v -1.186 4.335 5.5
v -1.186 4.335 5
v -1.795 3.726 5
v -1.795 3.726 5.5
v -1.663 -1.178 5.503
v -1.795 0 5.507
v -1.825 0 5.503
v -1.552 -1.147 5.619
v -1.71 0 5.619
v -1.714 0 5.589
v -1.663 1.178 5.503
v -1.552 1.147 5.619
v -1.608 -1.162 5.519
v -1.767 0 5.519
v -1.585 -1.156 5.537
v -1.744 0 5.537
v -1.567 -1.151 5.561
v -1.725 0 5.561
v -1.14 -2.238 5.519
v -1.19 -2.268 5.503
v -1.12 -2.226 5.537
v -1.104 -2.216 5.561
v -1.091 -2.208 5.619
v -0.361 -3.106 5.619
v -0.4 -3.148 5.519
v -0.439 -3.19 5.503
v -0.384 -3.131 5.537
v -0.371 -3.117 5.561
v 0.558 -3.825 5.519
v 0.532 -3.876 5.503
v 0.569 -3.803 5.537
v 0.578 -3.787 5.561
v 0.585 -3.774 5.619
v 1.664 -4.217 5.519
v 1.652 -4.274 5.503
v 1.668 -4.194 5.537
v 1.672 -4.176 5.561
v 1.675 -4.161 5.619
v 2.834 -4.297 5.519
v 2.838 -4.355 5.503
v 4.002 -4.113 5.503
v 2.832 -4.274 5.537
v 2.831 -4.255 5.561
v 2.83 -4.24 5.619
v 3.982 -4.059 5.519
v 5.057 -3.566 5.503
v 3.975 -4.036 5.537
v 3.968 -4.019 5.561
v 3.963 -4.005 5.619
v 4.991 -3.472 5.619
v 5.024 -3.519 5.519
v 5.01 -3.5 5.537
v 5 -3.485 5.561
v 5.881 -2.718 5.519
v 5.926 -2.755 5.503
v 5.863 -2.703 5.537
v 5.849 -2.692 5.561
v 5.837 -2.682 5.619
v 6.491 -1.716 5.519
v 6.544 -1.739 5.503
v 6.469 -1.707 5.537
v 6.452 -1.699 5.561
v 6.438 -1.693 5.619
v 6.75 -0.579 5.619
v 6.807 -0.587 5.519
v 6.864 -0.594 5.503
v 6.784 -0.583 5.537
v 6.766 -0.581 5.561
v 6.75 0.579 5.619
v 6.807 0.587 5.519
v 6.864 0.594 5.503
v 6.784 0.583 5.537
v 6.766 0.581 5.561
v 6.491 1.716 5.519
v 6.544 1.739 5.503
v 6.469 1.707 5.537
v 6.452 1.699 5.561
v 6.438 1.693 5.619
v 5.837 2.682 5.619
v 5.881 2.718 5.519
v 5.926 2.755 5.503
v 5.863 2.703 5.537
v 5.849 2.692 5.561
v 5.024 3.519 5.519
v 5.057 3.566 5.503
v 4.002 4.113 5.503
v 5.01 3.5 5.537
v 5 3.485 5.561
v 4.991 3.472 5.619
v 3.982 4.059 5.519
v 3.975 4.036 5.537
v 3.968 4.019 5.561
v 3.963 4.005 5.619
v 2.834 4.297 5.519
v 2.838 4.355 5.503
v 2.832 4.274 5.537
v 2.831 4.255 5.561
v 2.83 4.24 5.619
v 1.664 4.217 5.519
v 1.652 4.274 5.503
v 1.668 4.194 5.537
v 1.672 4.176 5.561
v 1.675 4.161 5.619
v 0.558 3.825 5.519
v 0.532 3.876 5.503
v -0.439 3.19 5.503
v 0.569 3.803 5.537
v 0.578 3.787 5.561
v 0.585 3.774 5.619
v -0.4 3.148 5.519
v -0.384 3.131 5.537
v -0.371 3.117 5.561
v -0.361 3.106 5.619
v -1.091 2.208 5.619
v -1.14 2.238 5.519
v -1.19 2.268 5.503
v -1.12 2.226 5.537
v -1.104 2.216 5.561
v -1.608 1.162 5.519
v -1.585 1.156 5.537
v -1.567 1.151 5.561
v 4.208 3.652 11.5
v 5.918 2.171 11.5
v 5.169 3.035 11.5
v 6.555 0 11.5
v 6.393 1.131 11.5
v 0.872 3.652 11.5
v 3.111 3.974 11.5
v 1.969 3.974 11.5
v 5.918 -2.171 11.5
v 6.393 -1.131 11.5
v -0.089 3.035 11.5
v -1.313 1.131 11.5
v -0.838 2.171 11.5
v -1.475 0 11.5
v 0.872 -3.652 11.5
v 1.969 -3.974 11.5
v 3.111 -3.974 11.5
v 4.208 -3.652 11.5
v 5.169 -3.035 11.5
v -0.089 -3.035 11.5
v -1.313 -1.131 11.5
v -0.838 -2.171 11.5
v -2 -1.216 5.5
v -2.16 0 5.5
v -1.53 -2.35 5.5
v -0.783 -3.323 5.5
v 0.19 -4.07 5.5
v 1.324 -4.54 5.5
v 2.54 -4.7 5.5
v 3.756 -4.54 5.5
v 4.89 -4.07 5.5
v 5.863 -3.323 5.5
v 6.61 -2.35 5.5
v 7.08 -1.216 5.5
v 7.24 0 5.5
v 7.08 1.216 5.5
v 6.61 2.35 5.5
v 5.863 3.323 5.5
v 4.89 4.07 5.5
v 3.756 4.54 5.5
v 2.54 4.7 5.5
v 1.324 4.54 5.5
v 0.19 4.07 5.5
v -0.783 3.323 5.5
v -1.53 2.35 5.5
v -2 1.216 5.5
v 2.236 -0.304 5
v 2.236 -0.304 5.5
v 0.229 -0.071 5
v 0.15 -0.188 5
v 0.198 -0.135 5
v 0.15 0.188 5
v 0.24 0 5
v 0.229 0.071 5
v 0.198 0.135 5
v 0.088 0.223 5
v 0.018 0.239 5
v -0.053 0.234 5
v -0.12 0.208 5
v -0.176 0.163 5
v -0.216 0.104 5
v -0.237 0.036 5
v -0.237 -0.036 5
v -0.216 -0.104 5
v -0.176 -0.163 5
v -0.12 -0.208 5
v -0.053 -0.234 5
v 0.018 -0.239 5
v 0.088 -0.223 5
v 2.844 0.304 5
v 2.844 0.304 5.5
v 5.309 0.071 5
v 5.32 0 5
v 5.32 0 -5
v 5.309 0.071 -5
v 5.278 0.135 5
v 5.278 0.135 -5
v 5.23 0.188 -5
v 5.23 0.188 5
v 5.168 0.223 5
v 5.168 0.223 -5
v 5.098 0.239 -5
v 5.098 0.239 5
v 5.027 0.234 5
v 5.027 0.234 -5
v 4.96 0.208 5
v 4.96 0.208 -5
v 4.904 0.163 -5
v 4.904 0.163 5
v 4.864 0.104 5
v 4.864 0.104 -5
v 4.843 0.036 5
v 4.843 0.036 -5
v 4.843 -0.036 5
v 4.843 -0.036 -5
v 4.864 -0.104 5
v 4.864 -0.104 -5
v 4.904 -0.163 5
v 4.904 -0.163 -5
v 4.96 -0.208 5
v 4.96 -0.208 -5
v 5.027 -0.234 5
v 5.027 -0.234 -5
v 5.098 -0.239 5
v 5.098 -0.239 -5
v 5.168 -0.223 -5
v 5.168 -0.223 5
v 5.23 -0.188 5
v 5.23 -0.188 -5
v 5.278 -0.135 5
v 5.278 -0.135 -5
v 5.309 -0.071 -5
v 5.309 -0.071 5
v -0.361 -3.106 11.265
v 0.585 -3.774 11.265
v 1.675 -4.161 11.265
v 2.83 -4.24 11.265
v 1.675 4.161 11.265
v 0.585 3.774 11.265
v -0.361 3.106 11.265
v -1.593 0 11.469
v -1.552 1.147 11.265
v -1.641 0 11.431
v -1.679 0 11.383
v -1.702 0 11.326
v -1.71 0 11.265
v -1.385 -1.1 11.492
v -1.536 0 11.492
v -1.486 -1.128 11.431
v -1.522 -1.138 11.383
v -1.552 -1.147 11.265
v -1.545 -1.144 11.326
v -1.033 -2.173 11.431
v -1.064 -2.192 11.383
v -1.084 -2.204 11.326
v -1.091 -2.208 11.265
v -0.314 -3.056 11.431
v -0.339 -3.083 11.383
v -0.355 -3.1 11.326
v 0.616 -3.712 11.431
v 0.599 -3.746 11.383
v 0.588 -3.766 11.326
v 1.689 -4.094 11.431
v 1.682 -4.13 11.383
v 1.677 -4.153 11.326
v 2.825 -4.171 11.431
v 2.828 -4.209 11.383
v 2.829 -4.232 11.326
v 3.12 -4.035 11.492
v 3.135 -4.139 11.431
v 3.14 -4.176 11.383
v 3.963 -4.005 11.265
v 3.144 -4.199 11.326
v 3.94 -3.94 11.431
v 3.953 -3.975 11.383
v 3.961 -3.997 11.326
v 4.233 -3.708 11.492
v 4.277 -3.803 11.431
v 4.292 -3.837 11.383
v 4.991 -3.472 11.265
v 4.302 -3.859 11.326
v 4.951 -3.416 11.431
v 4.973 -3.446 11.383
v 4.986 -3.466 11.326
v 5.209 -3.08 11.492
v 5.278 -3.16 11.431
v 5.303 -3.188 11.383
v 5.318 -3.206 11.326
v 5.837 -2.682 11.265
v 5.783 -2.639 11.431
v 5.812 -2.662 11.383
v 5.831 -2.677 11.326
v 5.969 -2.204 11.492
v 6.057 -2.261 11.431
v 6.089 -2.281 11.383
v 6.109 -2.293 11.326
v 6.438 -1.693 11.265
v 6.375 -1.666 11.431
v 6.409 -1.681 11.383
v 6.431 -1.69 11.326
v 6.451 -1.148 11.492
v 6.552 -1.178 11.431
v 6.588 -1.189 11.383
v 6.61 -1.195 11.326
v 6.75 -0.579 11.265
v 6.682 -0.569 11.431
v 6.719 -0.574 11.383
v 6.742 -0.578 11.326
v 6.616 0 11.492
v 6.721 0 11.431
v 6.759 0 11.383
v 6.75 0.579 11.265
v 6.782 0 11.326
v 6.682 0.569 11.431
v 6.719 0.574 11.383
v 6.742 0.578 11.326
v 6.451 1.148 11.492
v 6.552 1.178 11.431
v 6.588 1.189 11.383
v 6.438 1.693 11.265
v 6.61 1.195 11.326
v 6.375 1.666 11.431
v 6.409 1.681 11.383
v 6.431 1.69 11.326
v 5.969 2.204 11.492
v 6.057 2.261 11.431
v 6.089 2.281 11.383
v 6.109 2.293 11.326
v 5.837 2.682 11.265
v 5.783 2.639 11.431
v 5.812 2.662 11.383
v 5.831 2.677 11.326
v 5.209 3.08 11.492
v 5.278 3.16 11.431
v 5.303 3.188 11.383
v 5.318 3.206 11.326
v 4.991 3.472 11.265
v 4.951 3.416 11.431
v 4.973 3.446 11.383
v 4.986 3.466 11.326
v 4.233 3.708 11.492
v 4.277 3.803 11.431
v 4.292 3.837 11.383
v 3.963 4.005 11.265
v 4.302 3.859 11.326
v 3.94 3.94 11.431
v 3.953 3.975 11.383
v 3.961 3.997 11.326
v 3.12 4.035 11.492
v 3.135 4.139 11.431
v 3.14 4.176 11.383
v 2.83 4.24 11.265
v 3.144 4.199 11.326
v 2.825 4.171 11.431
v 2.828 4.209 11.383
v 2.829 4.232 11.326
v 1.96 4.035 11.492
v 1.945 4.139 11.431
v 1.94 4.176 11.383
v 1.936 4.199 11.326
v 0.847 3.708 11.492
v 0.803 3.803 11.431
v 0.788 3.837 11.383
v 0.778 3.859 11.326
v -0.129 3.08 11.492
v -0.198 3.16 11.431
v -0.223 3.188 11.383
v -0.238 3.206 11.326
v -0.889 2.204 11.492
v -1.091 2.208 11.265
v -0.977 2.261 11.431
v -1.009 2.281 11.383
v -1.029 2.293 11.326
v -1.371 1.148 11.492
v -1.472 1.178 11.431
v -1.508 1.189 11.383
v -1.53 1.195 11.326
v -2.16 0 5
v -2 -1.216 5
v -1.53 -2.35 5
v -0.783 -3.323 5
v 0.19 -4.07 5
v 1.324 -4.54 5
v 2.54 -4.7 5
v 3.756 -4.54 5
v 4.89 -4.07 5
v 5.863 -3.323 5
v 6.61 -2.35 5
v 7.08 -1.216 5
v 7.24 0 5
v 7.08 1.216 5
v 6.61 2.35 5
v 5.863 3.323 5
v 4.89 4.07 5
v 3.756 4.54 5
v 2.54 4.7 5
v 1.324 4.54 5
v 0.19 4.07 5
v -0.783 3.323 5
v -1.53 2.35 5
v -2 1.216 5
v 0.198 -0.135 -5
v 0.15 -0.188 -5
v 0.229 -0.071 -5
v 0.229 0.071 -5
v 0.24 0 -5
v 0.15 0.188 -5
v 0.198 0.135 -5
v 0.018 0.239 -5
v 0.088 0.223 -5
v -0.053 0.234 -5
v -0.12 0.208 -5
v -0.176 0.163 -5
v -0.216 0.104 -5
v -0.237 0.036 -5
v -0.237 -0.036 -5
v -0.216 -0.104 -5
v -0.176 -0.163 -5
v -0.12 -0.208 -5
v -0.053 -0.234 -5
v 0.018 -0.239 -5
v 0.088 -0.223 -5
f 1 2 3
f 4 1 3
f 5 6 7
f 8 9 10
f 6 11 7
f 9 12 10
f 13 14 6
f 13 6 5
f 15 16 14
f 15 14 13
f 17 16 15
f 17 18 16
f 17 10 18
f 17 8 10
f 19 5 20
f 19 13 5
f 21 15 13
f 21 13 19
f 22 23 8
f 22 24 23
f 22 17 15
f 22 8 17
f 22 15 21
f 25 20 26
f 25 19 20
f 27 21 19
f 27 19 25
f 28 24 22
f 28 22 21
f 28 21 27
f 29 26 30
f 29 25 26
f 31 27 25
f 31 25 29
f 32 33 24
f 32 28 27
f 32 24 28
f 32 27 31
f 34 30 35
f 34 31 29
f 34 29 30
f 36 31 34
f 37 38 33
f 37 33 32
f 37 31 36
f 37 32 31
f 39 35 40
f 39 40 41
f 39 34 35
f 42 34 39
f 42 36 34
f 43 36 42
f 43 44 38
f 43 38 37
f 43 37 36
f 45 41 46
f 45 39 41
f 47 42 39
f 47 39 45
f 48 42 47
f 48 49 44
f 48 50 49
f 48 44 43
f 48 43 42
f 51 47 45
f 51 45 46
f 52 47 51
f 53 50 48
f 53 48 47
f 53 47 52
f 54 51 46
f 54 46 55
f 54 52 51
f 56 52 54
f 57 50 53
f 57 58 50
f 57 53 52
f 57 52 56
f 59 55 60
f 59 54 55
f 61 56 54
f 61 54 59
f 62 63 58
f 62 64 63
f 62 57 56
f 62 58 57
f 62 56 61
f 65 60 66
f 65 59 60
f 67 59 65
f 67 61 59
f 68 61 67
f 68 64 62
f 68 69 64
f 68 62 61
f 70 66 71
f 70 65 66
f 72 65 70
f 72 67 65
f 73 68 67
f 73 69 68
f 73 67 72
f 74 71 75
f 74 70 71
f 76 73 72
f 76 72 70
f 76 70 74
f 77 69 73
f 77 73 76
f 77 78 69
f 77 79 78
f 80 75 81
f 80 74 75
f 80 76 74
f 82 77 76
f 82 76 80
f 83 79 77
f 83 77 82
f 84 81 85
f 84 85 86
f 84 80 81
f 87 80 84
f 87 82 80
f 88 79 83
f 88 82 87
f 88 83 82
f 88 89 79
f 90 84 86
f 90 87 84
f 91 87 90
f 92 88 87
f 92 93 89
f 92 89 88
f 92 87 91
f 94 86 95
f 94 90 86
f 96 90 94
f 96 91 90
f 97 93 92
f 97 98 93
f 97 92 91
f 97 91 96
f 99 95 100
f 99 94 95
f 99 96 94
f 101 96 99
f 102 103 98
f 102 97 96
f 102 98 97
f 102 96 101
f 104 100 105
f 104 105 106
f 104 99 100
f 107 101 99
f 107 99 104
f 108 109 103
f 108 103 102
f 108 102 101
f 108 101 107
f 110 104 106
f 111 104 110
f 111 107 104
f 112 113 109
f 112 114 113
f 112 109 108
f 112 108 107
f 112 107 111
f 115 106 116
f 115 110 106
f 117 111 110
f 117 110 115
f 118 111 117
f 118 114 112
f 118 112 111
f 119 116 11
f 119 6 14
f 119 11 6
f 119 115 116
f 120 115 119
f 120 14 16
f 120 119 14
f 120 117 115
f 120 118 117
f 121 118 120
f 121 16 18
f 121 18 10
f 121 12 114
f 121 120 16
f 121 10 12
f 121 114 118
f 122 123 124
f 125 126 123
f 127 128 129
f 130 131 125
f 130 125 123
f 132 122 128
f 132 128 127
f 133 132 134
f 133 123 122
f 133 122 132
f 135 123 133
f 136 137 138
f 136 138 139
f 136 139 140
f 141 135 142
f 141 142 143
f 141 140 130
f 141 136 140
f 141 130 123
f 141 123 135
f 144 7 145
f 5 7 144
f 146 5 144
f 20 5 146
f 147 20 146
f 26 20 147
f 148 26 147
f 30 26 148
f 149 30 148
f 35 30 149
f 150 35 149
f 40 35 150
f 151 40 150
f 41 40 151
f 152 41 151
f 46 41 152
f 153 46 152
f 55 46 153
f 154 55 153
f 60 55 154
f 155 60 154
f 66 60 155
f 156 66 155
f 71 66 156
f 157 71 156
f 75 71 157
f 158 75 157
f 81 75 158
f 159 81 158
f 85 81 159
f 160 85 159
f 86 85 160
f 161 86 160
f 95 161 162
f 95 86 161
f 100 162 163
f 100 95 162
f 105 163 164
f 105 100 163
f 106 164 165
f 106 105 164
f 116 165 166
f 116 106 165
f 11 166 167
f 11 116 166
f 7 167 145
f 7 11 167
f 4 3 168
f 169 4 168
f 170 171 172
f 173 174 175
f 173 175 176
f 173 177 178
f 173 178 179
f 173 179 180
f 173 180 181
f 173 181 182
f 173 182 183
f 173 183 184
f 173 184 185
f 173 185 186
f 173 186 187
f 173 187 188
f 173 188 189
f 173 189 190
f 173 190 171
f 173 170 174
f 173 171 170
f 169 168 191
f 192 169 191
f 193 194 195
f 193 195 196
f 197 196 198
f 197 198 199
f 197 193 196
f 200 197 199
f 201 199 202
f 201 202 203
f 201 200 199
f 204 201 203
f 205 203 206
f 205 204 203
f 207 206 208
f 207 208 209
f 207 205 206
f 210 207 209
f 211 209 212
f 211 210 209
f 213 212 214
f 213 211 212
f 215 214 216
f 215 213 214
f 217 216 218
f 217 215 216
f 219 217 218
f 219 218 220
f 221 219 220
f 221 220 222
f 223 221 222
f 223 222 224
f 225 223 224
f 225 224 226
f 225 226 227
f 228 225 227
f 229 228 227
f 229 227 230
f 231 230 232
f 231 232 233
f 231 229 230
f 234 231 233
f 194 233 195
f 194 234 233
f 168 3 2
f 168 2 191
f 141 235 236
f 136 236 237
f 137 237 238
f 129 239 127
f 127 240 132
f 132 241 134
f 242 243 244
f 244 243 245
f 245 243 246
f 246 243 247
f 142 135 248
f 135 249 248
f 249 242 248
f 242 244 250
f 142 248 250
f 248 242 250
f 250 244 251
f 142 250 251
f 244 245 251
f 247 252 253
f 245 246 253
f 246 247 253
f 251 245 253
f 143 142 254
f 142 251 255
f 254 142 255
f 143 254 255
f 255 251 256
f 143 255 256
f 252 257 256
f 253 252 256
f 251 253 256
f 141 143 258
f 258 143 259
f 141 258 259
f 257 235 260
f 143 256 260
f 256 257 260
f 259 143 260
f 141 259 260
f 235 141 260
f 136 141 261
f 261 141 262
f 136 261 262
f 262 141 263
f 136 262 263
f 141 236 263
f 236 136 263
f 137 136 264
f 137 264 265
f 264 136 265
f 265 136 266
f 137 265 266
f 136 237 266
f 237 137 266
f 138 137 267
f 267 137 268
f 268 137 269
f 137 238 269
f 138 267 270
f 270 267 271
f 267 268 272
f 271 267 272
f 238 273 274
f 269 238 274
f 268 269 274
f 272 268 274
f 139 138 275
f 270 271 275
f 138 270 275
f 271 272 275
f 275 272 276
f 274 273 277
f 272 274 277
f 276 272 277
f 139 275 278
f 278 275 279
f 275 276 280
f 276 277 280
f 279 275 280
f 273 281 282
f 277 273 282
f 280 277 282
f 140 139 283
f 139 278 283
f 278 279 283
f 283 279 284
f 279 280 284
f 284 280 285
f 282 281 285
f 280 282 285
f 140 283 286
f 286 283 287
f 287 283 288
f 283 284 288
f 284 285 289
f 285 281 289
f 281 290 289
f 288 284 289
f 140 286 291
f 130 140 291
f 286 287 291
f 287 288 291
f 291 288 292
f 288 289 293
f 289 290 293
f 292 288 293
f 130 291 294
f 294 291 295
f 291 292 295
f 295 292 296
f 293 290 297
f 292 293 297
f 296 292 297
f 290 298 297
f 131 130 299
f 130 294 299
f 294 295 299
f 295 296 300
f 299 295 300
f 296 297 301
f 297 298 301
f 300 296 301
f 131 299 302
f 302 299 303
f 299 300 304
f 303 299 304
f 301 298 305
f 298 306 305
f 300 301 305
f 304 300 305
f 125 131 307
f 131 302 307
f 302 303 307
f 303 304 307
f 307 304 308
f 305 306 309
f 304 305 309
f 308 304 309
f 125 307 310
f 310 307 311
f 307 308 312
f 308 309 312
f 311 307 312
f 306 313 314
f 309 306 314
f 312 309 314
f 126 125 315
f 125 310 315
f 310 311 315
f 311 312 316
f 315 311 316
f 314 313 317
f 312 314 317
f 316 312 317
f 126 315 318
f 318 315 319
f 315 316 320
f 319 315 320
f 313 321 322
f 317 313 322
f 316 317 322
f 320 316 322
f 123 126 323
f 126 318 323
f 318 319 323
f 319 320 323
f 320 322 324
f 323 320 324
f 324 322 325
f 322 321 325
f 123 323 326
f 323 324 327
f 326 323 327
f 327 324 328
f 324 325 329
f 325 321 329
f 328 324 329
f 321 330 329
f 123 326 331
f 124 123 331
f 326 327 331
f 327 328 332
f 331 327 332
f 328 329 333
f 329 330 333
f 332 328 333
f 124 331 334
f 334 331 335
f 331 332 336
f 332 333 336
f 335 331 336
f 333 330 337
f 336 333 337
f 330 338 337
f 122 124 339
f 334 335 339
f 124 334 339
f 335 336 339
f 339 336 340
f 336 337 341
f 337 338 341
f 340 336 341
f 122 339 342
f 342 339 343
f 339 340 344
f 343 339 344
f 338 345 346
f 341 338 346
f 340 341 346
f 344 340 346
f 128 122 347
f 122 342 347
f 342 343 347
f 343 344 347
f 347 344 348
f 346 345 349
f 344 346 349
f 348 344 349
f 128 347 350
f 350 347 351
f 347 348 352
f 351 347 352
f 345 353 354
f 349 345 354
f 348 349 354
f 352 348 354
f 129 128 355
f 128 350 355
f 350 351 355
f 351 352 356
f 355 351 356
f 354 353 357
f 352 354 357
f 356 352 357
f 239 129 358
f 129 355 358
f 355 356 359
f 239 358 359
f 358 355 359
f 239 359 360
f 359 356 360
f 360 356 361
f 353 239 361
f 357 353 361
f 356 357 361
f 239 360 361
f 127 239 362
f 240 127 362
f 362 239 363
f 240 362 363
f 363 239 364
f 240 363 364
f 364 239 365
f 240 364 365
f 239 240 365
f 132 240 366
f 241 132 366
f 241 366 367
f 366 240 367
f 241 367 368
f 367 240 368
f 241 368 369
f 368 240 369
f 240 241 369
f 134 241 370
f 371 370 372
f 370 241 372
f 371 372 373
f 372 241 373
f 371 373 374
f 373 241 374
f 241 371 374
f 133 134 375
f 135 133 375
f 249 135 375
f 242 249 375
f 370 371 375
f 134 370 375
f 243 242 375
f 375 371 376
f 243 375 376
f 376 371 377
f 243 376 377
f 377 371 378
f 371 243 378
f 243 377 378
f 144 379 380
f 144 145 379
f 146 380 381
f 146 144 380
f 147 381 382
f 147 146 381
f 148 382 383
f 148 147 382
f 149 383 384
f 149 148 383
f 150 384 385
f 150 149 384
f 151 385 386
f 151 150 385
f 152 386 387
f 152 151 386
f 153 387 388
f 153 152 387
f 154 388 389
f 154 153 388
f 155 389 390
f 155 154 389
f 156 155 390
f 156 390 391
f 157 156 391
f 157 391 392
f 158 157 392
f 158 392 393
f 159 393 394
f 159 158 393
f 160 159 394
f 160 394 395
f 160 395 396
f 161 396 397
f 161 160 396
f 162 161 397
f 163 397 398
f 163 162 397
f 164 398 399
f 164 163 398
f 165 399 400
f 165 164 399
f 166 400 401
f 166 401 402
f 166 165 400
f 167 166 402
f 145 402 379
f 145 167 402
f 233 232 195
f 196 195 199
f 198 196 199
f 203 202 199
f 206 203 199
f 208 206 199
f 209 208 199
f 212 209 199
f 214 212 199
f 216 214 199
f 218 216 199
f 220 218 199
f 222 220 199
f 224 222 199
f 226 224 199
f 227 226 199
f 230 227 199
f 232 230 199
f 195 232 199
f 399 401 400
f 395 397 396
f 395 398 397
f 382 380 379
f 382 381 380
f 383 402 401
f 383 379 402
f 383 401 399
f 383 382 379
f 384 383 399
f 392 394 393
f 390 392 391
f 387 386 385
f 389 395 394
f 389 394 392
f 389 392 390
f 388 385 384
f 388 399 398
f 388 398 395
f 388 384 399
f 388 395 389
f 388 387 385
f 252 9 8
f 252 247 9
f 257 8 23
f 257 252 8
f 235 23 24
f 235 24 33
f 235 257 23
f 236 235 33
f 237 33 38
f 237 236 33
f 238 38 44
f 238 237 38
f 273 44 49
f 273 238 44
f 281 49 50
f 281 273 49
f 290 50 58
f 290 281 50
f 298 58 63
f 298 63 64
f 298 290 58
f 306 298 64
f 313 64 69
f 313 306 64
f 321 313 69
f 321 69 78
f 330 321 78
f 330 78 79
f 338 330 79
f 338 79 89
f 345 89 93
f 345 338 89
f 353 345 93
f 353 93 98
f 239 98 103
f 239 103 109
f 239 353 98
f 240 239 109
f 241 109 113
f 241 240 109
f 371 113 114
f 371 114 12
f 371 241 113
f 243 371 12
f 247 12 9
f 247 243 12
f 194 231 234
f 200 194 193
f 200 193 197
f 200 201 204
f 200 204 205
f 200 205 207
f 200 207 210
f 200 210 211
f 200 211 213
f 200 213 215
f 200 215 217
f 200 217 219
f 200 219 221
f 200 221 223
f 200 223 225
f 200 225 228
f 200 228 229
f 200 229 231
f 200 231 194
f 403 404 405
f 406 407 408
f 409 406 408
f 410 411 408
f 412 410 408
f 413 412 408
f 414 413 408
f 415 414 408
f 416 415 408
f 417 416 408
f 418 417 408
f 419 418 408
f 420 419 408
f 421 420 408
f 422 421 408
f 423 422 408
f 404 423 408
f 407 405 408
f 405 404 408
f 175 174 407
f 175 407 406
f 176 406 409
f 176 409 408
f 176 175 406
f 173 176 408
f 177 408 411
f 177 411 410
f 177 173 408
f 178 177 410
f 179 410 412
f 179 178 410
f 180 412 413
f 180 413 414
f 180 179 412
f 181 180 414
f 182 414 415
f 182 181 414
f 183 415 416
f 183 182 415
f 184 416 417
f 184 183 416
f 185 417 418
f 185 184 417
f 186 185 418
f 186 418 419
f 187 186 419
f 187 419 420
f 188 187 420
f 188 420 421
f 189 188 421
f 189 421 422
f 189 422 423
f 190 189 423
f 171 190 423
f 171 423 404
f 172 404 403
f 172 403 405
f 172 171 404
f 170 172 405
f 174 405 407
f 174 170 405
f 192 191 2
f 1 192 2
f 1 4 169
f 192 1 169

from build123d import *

# Parameters (mm, degrees)
SKETCH_R     = 0.24
PAD_DEPTH    = 10
PAD003_DEPTH = 0.5


with BuildPart() as pad:
    # Sketch → Pad (new body)
    with BuildSketch(Plane.XY.offset(5)):
        Circle(SKETCH_R)
        with Locations((5.08, 0)):
            Circle(SKETCH_R)
    extrude(amount=-PAD_DEPTH)


with BuildPart() as revolution:
    # Sketch003 → Revolution (revolve)
    with BuildSketch(Plane.XZ):
        with BuildLine():
            Line((2.54, 5), (-2.16, 5))
            Line((-2.16, 5), (-2.16, 5.5))
            Line((-2.16, 5.5), (-1.825122, 5.502883))
            ThreePointArc((-1.825122, 5.502883), (-1.743659, 5.537244), (-1.71, 5.619001))
            Line((-1.71, 5.619001), (-1.71, 11.26523))
            ThreePointArc((-1.47523, 11.5), (-1.641237, 11.431237), (-1.71, 11.26523))
            Line((-1.47523, 11.5), (2.54, 11.5))
            Line((2.54, 11.5), (2.54, 5))
        make_face()
    revolve(axis=Axis((2.54, 0, 2.550668), (0, 0, 1)))


with BuildPart() as pad003:
    # Sketch004 → Pad003 (new body)
    with BuildSketch(Plane.XY.offset(5)):
        Polygon((2.844056, 0.304056), (-1.186453, 4.334565), (-1.794565, 3.726453), (2.235944, -0.304056), align=None)
    extrude(amount=PAD003_DEPTH)


solid = Compound([pad.part, revolution.part, pad003.part])
